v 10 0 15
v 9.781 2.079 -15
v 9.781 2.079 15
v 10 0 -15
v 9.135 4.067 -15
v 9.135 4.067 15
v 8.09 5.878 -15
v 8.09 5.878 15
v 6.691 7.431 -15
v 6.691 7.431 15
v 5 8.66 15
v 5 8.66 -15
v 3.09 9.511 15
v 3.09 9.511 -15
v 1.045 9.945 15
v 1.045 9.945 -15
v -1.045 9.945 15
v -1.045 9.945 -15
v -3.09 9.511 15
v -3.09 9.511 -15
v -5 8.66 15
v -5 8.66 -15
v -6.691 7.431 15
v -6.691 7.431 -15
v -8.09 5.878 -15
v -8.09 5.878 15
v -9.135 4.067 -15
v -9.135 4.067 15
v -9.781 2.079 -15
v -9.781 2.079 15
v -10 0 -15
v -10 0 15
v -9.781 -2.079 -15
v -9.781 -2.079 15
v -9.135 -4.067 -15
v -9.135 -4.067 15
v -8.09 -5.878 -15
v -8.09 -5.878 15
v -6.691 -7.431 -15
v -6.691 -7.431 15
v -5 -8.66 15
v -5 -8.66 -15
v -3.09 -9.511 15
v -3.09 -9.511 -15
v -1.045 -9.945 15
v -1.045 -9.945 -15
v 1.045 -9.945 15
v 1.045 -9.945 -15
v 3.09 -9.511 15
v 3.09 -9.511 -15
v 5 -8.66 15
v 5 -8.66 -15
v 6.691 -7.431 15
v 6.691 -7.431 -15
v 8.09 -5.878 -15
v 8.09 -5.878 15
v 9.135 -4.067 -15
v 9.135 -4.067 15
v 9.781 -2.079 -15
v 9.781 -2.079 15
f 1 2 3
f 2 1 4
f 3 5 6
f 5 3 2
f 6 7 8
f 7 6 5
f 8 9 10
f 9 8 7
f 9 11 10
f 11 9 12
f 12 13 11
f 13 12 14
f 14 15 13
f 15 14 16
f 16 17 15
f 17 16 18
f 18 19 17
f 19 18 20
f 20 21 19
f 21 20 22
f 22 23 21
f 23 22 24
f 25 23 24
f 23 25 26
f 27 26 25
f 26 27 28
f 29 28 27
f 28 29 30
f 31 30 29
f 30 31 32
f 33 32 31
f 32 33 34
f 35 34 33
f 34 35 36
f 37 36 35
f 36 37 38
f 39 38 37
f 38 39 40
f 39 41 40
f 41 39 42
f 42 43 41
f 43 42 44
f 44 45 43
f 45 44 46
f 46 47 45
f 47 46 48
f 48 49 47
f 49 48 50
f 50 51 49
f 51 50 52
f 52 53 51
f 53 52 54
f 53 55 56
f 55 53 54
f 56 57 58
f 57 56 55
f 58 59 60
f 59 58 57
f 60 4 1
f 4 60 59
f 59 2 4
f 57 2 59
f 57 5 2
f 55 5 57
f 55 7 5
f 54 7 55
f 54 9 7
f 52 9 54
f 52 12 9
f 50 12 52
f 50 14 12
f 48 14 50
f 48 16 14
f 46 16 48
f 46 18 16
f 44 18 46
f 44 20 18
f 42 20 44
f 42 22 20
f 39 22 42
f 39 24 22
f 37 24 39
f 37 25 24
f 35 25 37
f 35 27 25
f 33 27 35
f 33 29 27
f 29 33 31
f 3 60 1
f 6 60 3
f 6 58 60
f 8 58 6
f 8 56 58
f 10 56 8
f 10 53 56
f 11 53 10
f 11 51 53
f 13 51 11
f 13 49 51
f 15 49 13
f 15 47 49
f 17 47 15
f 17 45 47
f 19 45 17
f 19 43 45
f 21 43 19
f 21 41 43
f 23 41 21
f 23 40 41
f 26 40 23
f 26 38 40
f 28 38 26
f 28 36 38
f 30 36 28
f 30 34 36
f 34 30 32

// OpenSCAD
// Cylinder (diameter 20, height 30)
cylinder(h = 30, d = 20, center = true);
